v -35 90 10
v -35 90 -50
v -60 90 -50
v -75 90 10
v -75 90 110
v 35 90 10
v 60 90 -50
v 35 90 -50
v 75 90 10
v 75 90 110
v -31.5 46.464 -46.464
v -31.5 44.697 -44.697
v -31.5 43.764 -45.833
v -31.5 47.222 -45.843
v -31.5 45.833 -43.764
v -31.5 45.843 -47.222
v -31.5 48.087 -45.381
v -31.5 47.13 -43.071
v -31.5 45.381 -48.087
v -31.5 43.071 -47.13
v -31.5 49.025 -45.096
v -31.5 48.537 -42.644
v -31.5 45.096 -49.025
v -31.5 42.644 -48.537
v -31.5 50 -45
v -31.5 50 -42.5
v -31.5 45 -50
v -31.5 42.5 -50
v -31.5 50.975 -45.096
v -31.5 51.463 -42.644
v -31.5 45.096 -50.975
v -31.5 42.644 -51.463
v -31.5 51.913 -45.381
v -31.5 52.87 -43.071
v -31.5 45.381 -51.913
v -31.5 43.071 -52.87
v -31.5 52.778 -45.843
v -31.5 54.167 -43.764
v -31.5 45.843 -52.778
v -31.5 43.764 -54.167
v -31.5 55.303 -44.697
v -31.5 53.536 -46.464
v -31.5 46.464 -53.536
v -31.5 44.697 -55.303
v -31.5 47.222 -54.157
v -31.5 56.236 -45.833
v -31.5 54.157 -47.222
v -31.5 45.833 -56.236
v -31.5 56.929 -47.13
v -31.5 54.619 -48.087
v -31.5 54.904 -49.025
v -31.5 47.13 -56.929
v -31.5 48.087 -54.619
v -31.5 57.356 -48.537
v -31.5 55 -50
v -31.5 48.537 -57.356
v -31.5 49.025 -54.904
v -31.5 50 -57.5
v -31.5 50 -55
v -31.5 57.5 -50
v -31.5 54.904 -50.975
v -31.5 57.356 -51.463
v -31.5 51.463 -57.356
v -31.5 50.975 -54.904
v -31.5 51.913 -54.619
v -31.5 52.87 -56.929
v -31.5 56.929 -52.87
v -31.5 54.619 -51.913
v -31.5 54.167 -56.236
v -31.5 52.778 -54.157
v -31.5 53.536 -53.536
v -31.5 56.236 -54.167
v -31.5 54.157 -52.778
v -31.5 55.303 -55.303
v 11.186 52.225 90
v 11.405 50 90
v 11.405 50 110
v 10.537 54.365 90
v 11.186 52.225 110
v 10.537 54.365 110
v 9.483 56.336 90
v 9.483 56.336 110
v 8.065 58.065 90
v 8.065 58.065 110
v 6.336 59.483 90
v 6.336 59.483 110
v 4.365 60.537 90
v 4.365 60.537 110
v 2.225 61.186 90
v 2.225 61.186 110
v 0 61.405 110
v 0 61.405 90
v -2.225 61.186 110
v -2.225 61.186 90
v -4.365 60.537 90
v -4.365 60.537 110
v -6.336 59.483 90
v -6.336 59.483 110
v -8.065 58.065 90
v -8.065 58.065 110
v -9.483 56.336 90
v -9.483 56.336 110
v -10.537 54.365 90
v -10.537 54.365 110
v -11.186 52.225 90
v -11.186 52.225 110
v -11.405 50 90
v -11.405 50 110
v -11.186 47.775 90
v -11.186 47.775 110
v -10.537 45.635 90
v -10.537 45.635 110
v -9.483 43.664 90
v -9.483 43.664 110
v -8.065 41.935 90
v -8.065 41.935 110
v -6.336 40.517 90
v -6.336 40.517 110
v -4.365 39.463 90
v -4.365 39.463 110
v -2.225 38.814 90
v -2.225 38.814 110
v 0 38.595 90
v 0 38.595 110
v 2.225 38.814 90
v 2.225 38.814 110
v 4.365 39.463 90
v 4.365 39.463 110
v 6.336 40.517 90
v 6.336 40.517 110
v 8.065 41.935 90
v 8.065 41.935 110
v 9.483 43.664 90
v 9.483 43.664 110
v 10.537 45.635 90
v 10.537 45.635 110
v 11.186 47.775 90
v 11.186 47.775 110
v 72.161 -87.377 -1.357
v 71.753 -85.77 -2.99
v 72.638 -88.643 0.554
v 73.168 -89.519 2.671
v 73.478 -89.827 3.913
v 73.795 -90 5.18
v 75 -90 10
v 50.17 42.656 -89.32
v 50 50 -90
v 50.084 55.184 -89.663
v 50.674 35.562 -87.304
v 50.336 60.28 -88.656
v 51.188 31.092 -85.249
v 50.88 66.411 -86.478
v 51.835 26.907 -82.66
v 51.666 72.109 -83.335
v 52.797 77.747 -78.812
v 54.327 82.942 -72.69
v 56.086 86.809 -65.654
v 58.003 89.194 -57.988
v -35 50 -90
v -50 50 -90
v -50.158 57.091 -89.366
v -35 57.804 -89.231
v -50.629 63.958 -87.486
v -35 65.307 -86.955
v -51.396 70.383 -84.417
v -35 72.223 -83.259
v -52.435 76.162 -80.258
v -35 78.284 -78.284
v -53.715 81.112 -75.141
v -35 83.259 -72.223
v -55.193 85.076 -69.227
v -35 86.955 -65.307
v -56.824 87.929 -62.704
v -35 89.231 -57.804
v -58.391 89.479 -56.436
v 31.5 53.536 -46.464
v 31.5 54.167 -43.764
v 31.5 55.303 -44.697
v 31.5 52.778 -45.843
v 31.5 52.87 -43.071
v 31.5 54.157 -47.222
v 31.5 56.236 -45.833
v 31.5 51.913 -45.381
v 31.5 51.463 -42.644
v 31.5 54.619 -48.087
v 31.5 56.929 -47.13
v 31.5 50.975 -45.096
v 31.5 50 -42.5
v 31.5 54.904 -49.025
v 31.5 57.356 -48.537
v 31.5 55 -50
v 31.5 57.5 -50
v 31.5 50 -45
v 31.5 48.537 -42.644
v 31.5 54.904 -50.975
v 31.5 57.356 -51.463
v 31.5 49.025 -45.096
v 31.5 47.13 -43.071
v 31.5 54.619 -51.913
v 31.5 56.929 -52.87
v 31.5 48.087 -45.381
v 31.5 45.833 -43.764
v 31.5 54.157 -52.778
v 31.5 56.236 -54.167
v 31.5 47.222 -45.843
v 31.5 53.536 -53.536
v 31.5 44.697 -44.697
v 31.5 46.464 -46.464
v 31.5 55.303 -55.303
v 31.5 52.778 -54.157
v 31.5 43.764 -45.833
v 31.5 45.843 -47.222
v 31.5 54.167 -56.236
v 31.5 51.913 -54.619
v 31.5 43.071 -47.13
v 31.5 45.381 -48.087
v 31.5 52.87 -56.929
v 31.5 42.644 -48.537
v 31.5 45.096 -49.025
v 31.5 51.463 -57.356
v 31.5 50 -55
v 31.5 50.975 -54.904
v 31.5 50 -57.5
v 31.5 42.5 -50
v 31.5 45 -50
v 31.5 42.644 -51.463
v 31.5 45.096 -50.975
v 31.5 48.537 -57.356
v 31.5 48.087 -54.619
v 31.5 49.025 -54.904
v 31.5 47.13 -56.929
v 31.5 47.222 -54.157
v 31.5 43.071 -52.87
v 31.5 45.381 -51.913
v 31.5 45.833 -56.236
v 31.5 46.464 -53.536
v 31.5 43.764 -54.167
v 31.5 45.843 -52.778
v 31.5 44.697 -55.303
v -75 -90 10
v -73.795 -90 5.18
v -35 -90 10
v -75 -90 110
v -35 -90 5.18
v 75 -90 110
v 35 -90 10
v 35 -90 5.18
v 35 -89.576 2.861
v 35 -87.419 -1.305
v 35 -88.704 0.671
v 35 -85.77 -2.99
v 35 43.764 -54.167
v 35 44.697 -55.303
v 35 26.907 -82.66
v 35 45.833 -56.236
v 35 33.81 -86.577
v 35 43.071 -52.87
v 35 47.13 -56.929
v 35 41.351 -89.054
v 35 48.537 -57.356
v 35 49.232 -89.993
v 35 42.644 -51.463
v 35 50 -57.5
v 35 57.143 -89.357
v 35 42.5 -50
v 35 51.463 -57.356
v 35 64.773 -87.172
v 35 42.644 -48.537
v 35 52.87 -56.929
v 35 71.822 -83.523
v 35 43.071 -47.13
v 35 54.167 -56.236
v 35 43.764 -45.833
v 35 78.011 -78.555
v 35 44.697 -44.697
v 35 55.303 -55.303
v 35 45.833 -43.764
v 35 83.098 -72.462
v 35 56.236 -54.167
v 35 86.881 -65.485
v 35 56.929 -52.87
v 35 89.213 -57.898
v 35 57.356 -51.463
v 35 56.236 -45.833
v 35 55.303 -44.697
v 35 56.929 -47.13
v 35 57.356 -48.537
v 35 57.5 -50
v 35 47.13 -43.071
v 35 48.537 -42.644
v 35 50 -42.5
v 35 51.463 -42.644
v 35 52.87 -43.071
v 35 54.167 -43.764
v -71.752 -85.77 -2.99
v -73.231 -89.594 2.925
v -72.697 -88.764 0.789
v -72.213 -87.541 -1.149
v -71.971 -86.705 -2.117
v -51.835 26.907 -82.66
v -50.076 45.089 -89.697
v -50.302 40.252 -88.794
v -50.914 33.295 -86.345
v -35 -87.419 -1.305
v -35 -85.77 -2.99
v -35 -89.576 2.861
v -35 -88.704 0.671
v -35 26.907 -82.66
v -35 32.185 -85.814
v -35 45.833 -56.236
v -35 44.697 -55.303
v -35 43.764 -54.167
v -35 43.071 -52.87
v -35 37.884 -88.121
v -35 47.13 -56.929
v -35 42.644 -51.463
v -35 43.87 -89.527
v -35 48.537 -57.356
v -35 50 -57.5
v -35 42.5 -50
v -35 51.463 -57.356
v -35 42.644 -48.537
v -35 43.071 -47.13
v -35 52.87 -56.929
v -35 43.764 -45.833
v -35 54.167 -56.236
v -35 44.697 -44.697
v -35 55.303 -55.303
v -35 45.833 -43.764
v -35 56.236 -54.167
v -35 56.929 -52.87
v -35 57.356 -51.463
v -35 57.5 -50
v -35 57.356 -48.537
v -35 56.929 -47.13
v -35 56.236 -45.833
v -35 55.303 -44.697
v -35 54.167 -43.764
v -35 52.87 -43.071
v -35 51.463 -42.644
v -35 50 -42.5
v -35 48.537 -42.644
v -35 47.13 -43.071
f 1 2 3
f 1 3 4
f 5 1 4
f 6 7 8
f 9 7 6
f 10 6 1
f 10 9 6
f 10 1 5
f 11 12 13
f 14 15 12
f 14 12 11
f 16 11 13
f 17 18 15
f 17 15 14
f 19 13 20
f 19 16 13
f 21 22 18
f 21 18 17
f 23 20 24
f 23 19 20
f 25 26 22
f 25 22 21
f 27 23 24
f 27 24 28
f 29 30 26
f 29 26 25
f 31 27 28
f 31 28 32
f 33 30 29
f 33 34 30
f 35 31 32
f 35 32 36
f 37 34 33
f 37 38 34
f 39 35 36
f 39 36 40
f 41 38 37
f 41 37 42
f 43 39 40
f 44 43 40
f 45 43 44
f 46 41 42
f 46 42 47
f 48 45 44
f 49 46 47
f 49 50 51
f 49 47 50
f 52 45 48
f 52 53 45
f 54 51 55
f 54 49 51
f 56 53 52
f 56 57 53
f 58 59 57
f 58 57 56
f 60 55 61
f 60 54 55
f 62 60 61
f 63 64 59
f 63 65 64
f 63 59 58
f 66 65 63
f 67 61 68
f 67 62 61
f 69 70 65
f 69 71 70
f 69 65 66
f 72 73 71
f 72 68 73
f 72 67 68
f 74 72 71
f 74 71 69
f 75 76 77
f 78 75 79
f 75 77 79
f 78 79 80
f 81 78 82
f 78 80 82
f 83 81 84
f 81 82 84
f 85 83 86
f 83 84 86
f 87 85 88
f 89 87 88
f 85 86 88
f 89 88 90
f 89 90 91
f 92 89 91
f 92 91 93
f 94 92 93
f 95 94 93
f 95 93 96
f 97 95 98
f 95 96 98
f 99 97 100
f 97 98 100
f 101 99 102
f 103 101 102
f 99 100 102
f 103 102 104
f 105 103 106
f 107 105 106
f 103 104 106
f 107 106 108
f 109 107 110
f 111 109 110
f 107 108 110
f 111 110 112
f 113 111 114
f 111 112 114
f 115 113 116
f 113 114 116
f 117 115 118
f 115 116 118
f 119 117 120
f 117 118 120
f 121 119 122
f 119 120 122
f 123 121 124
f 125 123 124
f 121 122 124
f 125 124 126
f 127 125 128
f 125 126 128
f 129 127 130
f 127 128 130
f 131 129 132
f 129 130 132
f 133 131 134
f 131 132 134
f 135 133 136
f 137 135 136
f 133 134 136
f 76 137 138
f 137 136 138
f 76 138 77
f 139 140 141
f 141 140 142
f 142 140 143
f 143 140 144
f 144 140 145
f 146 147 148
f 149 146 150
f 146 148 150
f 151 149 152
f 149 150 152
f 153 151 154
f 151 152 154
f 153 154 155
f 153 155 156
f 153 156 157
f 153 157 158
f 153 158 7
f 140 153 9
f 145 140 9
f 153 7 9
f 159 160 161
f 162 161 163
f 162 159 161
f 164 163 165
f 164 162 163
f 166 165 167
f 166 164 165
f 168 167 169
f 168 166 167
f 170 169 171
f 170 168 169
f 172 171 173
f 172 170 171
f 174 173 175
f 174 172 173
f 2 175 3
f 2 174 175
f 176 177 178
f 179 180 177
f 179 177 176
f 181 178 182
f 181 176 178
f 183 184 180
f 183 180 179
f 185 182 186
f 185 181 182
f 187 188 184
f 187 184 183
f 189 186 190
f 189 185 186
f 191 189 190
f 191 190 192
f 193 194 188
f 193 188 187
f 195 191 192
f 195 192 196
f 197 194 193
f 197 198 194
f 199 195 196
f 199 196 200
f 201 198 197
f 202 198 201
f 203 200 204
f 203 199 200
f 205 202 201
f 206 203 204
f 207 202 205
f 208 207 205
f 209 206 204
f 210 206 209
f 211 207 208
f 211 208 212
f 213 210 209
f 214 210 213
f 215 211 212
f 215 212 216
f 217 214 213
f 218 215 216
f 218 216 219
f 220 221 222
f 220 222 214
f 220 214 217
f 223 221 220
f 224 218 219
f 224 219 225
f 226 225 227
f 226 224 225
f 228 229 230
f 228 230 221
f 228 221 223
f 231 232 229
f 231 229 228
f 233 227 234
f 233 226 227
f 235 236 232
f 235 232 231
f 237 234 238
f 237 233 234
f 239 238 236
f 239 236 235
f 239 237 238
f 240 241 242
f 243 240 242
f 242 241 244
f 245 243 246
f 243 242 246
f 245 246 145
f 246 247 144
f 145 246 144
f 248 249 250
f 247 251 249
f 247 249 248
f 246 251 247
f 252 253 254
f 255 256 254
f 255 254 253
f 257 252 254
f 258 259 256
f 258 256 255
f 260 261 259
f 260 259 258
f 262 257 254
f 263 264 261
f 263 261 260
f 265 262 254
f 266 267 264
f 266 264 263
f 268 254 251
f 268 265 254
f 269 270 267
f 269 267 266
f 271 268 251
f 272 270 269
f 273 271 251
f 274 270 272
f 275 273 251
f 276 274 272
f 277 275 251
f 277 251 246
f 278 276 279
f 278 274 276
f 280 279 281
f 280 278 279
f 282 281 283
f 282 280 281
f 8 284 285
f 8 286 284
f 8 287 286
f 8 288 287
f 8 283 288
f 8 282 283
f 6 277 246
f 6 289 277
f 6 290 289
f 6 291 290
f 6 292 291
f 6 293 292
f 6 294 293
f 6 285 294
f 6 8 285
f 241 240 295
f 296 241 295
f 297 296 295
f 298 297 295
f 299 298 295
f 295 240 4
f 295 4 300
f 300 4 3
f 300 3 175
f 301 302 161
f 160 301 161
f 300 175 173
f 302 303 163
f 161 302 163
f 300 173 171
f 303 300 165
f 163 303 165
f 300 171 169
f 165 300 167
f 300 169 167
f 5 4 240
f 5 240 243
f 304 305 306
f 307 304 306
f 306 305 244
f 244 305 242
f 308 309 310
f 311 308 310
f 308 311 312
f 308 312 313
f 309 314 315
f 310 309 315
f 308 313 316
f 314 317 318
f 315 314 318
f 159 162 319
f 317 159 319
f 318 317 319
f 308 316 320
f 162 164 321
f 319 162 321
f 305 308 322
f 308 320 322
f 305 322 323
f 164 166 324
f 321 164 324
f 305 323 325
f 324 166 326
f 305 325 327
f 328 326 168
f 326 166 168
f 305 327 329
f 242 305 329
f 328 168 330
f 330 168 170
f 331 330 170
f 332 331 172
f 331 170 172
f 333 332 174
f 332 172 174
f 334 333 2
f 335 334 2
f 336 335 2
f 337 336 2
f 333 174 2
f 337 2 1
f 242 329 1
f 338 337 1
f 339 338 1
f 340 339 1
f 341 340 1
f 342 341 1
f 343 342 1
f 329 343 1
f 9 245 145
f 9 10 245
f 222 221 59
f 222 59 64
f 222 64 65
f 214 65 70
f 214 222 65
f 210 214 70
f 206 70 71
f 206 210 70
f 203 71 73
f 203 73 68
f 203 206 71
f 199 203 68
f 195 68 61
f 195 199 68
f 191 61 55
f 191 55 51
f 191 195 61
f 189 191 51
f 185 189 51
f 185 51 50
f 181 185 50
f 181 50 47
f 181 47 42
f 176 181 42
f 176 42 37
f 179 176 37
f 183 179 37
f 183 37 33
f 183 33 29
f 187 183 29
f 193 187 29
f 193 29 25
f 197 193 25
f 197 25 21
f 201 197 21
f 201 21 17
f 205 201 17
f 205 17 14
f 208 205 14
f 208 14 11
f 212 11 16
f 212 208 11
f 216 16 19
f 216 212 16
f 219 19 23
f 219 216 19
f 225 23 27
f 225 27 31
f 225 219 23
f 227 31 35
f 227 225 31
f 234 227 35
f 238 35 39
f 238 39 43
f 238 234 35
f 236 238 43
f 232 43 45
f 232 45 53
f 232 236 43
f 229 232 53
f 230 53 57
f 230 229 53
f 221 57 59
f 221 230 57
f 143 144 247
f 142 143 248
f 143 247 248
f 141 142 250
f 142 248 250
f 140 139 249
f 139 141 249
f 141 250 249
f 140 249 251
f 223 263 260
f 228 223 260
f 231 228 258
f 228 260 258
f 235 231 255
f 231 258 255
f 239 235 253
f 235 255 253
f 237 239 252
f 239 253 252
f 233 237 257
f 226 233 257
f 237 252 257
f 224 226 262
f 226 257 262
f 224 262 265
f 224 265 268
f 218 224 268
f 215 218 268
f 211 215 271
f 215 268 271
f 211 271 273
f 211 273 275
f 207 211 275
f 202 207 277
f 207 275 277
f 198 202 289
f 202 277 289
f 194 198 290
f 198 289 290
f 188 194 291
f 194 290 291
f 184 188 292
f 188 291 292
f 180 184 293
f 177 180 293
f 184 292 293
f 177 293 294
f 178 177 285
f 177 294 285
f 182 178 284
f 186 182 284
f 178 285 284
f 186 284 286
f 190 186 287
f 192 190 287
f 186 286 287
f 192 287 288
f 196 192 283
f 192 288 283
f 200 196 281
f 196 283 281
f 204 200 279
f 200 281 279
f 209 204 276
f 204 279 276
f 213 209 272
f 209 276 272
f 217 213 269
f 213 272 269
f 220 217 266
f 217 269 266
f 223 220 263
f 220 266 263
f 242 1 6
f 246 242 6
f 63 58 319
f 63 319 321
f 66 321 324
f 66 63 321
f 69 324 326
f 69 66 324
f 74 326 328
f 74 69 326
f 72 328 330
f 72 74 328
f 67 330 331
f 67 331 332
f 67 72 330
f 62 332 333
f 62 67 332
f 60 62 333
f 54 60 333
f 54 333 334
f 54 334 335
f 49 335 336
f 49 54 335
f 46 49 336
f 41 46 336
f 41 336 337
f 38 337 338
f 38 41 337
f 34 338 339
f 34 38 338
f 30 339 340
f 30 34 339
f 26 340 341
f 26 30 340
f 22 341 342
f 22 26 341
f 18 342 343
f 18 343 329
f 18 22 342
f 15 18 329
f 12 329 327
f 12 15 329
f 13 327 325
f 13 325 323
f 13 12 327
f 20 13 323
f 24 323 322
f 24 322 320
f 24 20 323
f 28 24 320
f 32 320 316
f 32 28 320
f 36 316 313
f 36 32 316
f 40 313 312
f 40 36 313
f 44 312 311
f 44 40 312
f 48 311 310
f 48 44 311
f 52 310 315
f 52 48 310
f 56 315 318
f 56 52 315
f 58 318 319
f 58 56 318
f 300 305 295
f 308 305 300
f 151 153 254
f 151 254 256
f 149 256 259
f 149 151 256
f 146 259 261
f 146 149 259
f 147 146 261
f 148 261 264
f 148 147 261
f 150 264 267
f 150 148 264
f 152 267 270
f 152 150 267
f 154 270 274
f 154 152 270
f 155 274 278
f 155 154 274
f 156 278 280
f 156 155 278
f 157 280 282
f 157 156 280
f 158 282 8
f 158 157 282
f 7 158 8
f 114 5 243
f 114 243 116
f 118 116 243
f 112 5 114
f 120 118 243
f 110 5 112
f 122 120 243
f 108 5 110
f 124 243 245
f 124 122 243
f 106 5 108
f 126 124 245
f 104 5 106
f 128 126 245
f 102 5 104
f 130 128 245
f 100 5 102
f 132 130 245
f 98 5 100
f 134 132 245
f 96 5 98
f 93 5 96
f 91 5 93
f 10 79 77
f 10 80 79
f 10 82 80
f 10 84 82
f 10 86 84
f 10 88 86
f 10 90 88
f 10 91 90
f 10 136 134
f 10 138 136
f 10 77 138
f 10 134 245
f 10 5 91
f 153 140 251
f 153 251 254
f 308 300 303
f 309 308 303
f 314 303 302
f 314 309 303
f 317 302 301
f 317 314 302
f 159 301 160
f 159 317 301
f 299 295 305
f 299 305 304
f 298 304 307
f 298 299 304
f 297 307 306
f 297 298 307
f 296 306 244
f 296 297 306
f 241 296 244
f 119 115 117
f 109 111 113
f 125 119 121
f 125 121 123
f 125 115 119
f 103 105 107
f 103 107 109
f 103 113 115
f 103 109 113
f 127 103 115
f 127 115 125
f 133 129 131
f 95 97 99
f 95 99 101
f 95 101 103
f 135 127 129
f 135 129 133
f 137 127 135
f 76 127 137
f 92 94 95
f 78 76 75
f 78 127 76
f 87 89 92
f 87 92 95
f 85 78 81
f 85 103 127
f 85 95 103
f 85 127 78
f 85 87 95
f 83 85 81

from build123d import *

# Parameters (mm, degrees)
SKETCH1_W            = 150
SKETCH1_H            = 180
BOSS_EXTRUDE1_DEPTH  = 110
SKETCH2_W            = 35
SKETCH2_H            = 10
CUT_EXTRUDE1_DEPTH   = 228
BOSS_EXTRUDE2_DEPTH  = 40
SKETCH5_R            = 40
SKETCH5_R_2          = 5
BOSS_EXTRUDE3_DEPTH  = 40
BOSS_EXTRUDE5_DEPTH  = 40
CUT_EXTRUDE2_DEPTH   = 40
BOSS_EXTRUDE6_DEPTH  = 40
CUT_EXTRUDE3_START   = -40
CUT_EXTRUDE3_DEPTH   = 40
BOSS_EXTRUDE7_START  = -30
SKETCH11_R           = 5
BOSS_EXTRUDE7_DEPTH  = 30
SKETCH12_R           = 5
BOSS_EXTRUDE8_DEPTH  = 30
CUT_EXTRUDE4_DEPTH   = 187
BOSS_EXTRUDE9_START  = 90
SKETCH16_R           = 5
BOSS_EXTRUDE9_DEPTH  = 90
BOSS_EXTRUDE10_START = 3.5
SKETCH17_R           = 7.5
SKETCH17_R_2         = 5
BOSS_EXTRUDE10_DEPTH = 3.5
SKETCH18_R           = 7.5
SKETCH18_R_2         = 5
BOSS_EXTRUDE11_DEPTH = 3.5
SKETCH20_R           = 11.405
CUT_EXTRUDE5_DEPTH   = 20


with BuildPart() as part:
    # Sketch1 → Boss-Extrude1 (new body)
    with BuildSketch(Plane.XY):
        Rectangle(SKETCH1_W, SKETCH1_H)
    extrude(amount=BOSS_EXTRUDE1_DEPTH)

    # Sketch2 → Cut-Extrude1 (cut)
    with BuildSketch(Plane(origin=(0, 90, 0), x_dir=(1, 0, 0), z_dir=(0, 1, 0))):
        with Locations((17.5, -5)):
            Rectangle(SKETCH2_W, SKETCH2_H)
        with Locations((-17.5, -5)):
            Rectangle(SKETCH2_W, SKETCH2_H)
    extrude(amount=-CUT_EXTRUDE1_DEPTH, mode=Mode.SUBTRACT)

    # Sketch3 → Boss-Extrude2 (add)
    with BuildSketch(Plane(origin=(-35, 0, 0), x_dir=(0, 0, -1), z_dir=(1, 0, 0))):
        with BuildLine():
            Line((50, 90), (0, 90))
            Line((0, 90), (0, 50))
            Line((0, 50), (10, 50))
            ThreePointArc((10, 50), (21.715728753, 78.284271247), (50, 90))
        make_face()
        with BuildLine():
            Line((10, 50), (0, 50))
            Line((0, 50), (0, -85.77))
            Line((0, -85.77), (2.99, -85.77))
            Line((2.99, -85.77), (82.660422477, 26.906780138))
            ThreePointArc((82.660422477, 26.906780138), (37.884243711, 11.879028743), (10, 50))
        make_face()
        with BuildLine():
            ThreePointArc((90, 50), (78.284271247, 78.284271247), (50, 90))
            Line((50, 90), (50, 55))
            ThreePointArc((50, 55), (53.535533906, 53.535533906), (55, 50))
            ThreePointArc((55, 50), (50, 45), (45, 50))
            Line((45, 50), (10, 50))
            ThreePointArc((10, 50), (37.884243711, 11.879028743), (82.660422477, 26.906780138))
            ThreePointArc((82.660422477, 26.906780138), (88.120971257, 37.884243711), (90, 50))
        make_face()
        with BuildLine():
            Line((50, 55), (50, 90))
            ThreePointArc((50, 90), (21.715728753, 78.284271247), (10, 50))
            Line((10, 50), (45, 50))
            ThreePointArc((45, 50), (46.464466094, 53.535533906), (50, 55))
        make_face()
    extrude(amount=-BOSS_EXTRUDE2_DEPTH)

    # Sketch5 → Boss-Extrude3 (add)
    # profile 1 of 2: a face of its own
    with BuildSketch(Plane(origin=(75, 0, 0), x_dir=(0, 0, -1), z_dir=(1, 0, 0))):
        with BuildLine():
            Line((50, 90), (0, 90))
            Line((0, 90), (0, -85.77))
            Line((0, -85.77), (2.99, -85.77))
            Line((2.99, -85.77), (82.660422477, 26.906780138))
            ThreePointArc((82.660422477, 26.906780138), (14.477269288, 31.61153615), (50, 90))
        make_face()
    # profile 2 of 2: a face of its own
    with BuildSketch(Plane(origin=(75, 0, 0), x_dir=(0, 0, -1), z_dir=(1, 0, 0))):
        with Locations((50, 50)):
            Circle(SKETCH5_R)
        with Locations((50, 50)):
            Circle(SKETCH5_R_2, mode=Mode.SUBTRACT)
    extrude(amount=-BOSS_EXTRUDE3_DEPTH)

    # Sketch6 → Boss-Extrude5 (add)
    with BuildSketch(Plane(origin=(75, 0, 0), x_dir=(0, 0, -1), z_dir=(1, 0, 0))):
        Polygon((2.99, -85.77), (0, -90), (0, -85.77), align=None)
    extrude(amount=-BOSS_EXTRUDE5_DEPTH)

    # Sketch8 → Cut-Extrude2 (cut)
    with BuildSketch(Plane.ZY.offset(-35)):
        with BuildLine():
            Line((0, -90), (5.18, -90))
            ThreePointArc((5.18, -90), (0.670947119, -88.704033579), (-2.99, -85.77))
            Line((-2.99, -85.77), (0, -90))
        make_face()
    extrude(amount=-CUT_EXTRUDE2_DEPTH, mode=Mode.SUBTRACT)

    # Sketch9 → Boss-Extrude6 (add)
    with BuildSketch(Plane.ZY.offset(75)):
        Polygon((-2.99, -85.77), (0, -90), (0, -85.77), align=None)
    extrude(amount=-BOSS_EXTRUDE6_DEPTH)

    # Sketch10 → Cut-Extrude3 (cut)
    with BuildSketch(Plane(origin=(-35, 0, 0), x_dir=(0, 0, -1), z_dir=(1, 0, 0)).offset(CUT_EXTRUDE3_START)):
        with BuildLine():
            Line((-5.18, -90), (0, -90))
            Line((0, -90), (2.99, -85.77))
            ThreePointArc((2.99, -85.77), (-0.670947119, -88.704033579), (-5.18, -90))
        make_face()
    extrude(amount=CUT_EXTRUDE3_DEPTH, mode=Mode.SUBTRACT)

    # Sketch11 → Boss-Extrude7 (add)
    with BuildSketch(Plane.ZY.offset(75).offset(BOSS_EXTRUDE7_START)):
        with Locations(Location((-50, 50, 0), (0, 0, 180))):
            Circle(SKETCH11_R)
    extrude(amount=BOSS_EXTRUDE7_DEPTH)

    # Sketch12 → Boss-Extrude8 (add)
    with BuildSketch(Plane(origin=(75, 0, 0), x_dir=(0, 0, -1), z_dir=(1, 0, 0))):
        with Locations((50, 50)):
            Circle(SKETCH12_R)
    extrude(amount=-BOSS_EXTRUDE8_DEPTH)

    # Sketch14 → Cut-Extrude4 (cut)
    with BuildSketch(Plane(origin=(0, 90, 0), x_dir=(1, 0, 0), z_dir=(0, 1, 0))):
        Polygon((-60, 50), (-50, 90), (-75, 90), (-75, 50), align=None)
        Polygon((-75, -10), (-60, 50), (-75, 50), (-75, 0), align=None)
        Polygon((60, 50), (75, -10), (75, 0), (75, 50), align=None)
        Polygon((50, 90), (60, 50), (75, 50), (75, 90), align=None)
    extrude(amount=-CUT_EXTRUDE4_DEPTH, mode=Mode.SUBTRACT)

    # Sketch16 → Boss-Extrude9 (add)
    with BuildSketch(Plane(origin=(-45, 0, 0), x_dir=(0, 0, -1), z_dir=(1, 0, 0)).offset(BOSS_EXTRUDE9_START)):
        with Locations((50, 50)):
            Circle(SKETCH16_R)
    extrude(amount=-BOSS_EXTRUDE9_DEPTH)

    # Sketch17 → Boss-Extrude10 (add)
    with BuildSketch(Plane(origin=(-35, 0, 0), x_dir=(0, 0, -1), z_dir=(1, 0, 0)).offset(BOSS_EXTRUDE10_START)):
        with Locations((50, 50)):
            Circle(SKETCH17_R)
        with Locations((50, 50)):
            Circle(SKETCH17_R_2, mode=Mode.SUBTRACT)
    extrude(amount=-BOSS_EXTRUDE10_DEPTH)

    # Sketch18 → Boss-Extrude11 (add)
    with BuildSketch(Plane.ZY.offset(-35)):
        with Locations(Location((-50, 50, 0), (0, 0, 180))):
            Circle(SKETCH18_R)
        with Locations((-50, 50)):
            Circle(SKETCH18_R_2, mode=Mode.SUBTRACT)
    extrude(amount=BOSS_EXTRUDE11_DEPTH)

    # Sketch20 → Cut-Extrude5 (cut)
    with BuildSketch(Plane.XY.offset(110)):
        with Locations((0, 50)):
            Circle(SKETCH20_R)
    extrude(amount=-CUT_EXTRUDE5_DEPTH, mode=Mode.SUBTRACT)


solid = part.part
